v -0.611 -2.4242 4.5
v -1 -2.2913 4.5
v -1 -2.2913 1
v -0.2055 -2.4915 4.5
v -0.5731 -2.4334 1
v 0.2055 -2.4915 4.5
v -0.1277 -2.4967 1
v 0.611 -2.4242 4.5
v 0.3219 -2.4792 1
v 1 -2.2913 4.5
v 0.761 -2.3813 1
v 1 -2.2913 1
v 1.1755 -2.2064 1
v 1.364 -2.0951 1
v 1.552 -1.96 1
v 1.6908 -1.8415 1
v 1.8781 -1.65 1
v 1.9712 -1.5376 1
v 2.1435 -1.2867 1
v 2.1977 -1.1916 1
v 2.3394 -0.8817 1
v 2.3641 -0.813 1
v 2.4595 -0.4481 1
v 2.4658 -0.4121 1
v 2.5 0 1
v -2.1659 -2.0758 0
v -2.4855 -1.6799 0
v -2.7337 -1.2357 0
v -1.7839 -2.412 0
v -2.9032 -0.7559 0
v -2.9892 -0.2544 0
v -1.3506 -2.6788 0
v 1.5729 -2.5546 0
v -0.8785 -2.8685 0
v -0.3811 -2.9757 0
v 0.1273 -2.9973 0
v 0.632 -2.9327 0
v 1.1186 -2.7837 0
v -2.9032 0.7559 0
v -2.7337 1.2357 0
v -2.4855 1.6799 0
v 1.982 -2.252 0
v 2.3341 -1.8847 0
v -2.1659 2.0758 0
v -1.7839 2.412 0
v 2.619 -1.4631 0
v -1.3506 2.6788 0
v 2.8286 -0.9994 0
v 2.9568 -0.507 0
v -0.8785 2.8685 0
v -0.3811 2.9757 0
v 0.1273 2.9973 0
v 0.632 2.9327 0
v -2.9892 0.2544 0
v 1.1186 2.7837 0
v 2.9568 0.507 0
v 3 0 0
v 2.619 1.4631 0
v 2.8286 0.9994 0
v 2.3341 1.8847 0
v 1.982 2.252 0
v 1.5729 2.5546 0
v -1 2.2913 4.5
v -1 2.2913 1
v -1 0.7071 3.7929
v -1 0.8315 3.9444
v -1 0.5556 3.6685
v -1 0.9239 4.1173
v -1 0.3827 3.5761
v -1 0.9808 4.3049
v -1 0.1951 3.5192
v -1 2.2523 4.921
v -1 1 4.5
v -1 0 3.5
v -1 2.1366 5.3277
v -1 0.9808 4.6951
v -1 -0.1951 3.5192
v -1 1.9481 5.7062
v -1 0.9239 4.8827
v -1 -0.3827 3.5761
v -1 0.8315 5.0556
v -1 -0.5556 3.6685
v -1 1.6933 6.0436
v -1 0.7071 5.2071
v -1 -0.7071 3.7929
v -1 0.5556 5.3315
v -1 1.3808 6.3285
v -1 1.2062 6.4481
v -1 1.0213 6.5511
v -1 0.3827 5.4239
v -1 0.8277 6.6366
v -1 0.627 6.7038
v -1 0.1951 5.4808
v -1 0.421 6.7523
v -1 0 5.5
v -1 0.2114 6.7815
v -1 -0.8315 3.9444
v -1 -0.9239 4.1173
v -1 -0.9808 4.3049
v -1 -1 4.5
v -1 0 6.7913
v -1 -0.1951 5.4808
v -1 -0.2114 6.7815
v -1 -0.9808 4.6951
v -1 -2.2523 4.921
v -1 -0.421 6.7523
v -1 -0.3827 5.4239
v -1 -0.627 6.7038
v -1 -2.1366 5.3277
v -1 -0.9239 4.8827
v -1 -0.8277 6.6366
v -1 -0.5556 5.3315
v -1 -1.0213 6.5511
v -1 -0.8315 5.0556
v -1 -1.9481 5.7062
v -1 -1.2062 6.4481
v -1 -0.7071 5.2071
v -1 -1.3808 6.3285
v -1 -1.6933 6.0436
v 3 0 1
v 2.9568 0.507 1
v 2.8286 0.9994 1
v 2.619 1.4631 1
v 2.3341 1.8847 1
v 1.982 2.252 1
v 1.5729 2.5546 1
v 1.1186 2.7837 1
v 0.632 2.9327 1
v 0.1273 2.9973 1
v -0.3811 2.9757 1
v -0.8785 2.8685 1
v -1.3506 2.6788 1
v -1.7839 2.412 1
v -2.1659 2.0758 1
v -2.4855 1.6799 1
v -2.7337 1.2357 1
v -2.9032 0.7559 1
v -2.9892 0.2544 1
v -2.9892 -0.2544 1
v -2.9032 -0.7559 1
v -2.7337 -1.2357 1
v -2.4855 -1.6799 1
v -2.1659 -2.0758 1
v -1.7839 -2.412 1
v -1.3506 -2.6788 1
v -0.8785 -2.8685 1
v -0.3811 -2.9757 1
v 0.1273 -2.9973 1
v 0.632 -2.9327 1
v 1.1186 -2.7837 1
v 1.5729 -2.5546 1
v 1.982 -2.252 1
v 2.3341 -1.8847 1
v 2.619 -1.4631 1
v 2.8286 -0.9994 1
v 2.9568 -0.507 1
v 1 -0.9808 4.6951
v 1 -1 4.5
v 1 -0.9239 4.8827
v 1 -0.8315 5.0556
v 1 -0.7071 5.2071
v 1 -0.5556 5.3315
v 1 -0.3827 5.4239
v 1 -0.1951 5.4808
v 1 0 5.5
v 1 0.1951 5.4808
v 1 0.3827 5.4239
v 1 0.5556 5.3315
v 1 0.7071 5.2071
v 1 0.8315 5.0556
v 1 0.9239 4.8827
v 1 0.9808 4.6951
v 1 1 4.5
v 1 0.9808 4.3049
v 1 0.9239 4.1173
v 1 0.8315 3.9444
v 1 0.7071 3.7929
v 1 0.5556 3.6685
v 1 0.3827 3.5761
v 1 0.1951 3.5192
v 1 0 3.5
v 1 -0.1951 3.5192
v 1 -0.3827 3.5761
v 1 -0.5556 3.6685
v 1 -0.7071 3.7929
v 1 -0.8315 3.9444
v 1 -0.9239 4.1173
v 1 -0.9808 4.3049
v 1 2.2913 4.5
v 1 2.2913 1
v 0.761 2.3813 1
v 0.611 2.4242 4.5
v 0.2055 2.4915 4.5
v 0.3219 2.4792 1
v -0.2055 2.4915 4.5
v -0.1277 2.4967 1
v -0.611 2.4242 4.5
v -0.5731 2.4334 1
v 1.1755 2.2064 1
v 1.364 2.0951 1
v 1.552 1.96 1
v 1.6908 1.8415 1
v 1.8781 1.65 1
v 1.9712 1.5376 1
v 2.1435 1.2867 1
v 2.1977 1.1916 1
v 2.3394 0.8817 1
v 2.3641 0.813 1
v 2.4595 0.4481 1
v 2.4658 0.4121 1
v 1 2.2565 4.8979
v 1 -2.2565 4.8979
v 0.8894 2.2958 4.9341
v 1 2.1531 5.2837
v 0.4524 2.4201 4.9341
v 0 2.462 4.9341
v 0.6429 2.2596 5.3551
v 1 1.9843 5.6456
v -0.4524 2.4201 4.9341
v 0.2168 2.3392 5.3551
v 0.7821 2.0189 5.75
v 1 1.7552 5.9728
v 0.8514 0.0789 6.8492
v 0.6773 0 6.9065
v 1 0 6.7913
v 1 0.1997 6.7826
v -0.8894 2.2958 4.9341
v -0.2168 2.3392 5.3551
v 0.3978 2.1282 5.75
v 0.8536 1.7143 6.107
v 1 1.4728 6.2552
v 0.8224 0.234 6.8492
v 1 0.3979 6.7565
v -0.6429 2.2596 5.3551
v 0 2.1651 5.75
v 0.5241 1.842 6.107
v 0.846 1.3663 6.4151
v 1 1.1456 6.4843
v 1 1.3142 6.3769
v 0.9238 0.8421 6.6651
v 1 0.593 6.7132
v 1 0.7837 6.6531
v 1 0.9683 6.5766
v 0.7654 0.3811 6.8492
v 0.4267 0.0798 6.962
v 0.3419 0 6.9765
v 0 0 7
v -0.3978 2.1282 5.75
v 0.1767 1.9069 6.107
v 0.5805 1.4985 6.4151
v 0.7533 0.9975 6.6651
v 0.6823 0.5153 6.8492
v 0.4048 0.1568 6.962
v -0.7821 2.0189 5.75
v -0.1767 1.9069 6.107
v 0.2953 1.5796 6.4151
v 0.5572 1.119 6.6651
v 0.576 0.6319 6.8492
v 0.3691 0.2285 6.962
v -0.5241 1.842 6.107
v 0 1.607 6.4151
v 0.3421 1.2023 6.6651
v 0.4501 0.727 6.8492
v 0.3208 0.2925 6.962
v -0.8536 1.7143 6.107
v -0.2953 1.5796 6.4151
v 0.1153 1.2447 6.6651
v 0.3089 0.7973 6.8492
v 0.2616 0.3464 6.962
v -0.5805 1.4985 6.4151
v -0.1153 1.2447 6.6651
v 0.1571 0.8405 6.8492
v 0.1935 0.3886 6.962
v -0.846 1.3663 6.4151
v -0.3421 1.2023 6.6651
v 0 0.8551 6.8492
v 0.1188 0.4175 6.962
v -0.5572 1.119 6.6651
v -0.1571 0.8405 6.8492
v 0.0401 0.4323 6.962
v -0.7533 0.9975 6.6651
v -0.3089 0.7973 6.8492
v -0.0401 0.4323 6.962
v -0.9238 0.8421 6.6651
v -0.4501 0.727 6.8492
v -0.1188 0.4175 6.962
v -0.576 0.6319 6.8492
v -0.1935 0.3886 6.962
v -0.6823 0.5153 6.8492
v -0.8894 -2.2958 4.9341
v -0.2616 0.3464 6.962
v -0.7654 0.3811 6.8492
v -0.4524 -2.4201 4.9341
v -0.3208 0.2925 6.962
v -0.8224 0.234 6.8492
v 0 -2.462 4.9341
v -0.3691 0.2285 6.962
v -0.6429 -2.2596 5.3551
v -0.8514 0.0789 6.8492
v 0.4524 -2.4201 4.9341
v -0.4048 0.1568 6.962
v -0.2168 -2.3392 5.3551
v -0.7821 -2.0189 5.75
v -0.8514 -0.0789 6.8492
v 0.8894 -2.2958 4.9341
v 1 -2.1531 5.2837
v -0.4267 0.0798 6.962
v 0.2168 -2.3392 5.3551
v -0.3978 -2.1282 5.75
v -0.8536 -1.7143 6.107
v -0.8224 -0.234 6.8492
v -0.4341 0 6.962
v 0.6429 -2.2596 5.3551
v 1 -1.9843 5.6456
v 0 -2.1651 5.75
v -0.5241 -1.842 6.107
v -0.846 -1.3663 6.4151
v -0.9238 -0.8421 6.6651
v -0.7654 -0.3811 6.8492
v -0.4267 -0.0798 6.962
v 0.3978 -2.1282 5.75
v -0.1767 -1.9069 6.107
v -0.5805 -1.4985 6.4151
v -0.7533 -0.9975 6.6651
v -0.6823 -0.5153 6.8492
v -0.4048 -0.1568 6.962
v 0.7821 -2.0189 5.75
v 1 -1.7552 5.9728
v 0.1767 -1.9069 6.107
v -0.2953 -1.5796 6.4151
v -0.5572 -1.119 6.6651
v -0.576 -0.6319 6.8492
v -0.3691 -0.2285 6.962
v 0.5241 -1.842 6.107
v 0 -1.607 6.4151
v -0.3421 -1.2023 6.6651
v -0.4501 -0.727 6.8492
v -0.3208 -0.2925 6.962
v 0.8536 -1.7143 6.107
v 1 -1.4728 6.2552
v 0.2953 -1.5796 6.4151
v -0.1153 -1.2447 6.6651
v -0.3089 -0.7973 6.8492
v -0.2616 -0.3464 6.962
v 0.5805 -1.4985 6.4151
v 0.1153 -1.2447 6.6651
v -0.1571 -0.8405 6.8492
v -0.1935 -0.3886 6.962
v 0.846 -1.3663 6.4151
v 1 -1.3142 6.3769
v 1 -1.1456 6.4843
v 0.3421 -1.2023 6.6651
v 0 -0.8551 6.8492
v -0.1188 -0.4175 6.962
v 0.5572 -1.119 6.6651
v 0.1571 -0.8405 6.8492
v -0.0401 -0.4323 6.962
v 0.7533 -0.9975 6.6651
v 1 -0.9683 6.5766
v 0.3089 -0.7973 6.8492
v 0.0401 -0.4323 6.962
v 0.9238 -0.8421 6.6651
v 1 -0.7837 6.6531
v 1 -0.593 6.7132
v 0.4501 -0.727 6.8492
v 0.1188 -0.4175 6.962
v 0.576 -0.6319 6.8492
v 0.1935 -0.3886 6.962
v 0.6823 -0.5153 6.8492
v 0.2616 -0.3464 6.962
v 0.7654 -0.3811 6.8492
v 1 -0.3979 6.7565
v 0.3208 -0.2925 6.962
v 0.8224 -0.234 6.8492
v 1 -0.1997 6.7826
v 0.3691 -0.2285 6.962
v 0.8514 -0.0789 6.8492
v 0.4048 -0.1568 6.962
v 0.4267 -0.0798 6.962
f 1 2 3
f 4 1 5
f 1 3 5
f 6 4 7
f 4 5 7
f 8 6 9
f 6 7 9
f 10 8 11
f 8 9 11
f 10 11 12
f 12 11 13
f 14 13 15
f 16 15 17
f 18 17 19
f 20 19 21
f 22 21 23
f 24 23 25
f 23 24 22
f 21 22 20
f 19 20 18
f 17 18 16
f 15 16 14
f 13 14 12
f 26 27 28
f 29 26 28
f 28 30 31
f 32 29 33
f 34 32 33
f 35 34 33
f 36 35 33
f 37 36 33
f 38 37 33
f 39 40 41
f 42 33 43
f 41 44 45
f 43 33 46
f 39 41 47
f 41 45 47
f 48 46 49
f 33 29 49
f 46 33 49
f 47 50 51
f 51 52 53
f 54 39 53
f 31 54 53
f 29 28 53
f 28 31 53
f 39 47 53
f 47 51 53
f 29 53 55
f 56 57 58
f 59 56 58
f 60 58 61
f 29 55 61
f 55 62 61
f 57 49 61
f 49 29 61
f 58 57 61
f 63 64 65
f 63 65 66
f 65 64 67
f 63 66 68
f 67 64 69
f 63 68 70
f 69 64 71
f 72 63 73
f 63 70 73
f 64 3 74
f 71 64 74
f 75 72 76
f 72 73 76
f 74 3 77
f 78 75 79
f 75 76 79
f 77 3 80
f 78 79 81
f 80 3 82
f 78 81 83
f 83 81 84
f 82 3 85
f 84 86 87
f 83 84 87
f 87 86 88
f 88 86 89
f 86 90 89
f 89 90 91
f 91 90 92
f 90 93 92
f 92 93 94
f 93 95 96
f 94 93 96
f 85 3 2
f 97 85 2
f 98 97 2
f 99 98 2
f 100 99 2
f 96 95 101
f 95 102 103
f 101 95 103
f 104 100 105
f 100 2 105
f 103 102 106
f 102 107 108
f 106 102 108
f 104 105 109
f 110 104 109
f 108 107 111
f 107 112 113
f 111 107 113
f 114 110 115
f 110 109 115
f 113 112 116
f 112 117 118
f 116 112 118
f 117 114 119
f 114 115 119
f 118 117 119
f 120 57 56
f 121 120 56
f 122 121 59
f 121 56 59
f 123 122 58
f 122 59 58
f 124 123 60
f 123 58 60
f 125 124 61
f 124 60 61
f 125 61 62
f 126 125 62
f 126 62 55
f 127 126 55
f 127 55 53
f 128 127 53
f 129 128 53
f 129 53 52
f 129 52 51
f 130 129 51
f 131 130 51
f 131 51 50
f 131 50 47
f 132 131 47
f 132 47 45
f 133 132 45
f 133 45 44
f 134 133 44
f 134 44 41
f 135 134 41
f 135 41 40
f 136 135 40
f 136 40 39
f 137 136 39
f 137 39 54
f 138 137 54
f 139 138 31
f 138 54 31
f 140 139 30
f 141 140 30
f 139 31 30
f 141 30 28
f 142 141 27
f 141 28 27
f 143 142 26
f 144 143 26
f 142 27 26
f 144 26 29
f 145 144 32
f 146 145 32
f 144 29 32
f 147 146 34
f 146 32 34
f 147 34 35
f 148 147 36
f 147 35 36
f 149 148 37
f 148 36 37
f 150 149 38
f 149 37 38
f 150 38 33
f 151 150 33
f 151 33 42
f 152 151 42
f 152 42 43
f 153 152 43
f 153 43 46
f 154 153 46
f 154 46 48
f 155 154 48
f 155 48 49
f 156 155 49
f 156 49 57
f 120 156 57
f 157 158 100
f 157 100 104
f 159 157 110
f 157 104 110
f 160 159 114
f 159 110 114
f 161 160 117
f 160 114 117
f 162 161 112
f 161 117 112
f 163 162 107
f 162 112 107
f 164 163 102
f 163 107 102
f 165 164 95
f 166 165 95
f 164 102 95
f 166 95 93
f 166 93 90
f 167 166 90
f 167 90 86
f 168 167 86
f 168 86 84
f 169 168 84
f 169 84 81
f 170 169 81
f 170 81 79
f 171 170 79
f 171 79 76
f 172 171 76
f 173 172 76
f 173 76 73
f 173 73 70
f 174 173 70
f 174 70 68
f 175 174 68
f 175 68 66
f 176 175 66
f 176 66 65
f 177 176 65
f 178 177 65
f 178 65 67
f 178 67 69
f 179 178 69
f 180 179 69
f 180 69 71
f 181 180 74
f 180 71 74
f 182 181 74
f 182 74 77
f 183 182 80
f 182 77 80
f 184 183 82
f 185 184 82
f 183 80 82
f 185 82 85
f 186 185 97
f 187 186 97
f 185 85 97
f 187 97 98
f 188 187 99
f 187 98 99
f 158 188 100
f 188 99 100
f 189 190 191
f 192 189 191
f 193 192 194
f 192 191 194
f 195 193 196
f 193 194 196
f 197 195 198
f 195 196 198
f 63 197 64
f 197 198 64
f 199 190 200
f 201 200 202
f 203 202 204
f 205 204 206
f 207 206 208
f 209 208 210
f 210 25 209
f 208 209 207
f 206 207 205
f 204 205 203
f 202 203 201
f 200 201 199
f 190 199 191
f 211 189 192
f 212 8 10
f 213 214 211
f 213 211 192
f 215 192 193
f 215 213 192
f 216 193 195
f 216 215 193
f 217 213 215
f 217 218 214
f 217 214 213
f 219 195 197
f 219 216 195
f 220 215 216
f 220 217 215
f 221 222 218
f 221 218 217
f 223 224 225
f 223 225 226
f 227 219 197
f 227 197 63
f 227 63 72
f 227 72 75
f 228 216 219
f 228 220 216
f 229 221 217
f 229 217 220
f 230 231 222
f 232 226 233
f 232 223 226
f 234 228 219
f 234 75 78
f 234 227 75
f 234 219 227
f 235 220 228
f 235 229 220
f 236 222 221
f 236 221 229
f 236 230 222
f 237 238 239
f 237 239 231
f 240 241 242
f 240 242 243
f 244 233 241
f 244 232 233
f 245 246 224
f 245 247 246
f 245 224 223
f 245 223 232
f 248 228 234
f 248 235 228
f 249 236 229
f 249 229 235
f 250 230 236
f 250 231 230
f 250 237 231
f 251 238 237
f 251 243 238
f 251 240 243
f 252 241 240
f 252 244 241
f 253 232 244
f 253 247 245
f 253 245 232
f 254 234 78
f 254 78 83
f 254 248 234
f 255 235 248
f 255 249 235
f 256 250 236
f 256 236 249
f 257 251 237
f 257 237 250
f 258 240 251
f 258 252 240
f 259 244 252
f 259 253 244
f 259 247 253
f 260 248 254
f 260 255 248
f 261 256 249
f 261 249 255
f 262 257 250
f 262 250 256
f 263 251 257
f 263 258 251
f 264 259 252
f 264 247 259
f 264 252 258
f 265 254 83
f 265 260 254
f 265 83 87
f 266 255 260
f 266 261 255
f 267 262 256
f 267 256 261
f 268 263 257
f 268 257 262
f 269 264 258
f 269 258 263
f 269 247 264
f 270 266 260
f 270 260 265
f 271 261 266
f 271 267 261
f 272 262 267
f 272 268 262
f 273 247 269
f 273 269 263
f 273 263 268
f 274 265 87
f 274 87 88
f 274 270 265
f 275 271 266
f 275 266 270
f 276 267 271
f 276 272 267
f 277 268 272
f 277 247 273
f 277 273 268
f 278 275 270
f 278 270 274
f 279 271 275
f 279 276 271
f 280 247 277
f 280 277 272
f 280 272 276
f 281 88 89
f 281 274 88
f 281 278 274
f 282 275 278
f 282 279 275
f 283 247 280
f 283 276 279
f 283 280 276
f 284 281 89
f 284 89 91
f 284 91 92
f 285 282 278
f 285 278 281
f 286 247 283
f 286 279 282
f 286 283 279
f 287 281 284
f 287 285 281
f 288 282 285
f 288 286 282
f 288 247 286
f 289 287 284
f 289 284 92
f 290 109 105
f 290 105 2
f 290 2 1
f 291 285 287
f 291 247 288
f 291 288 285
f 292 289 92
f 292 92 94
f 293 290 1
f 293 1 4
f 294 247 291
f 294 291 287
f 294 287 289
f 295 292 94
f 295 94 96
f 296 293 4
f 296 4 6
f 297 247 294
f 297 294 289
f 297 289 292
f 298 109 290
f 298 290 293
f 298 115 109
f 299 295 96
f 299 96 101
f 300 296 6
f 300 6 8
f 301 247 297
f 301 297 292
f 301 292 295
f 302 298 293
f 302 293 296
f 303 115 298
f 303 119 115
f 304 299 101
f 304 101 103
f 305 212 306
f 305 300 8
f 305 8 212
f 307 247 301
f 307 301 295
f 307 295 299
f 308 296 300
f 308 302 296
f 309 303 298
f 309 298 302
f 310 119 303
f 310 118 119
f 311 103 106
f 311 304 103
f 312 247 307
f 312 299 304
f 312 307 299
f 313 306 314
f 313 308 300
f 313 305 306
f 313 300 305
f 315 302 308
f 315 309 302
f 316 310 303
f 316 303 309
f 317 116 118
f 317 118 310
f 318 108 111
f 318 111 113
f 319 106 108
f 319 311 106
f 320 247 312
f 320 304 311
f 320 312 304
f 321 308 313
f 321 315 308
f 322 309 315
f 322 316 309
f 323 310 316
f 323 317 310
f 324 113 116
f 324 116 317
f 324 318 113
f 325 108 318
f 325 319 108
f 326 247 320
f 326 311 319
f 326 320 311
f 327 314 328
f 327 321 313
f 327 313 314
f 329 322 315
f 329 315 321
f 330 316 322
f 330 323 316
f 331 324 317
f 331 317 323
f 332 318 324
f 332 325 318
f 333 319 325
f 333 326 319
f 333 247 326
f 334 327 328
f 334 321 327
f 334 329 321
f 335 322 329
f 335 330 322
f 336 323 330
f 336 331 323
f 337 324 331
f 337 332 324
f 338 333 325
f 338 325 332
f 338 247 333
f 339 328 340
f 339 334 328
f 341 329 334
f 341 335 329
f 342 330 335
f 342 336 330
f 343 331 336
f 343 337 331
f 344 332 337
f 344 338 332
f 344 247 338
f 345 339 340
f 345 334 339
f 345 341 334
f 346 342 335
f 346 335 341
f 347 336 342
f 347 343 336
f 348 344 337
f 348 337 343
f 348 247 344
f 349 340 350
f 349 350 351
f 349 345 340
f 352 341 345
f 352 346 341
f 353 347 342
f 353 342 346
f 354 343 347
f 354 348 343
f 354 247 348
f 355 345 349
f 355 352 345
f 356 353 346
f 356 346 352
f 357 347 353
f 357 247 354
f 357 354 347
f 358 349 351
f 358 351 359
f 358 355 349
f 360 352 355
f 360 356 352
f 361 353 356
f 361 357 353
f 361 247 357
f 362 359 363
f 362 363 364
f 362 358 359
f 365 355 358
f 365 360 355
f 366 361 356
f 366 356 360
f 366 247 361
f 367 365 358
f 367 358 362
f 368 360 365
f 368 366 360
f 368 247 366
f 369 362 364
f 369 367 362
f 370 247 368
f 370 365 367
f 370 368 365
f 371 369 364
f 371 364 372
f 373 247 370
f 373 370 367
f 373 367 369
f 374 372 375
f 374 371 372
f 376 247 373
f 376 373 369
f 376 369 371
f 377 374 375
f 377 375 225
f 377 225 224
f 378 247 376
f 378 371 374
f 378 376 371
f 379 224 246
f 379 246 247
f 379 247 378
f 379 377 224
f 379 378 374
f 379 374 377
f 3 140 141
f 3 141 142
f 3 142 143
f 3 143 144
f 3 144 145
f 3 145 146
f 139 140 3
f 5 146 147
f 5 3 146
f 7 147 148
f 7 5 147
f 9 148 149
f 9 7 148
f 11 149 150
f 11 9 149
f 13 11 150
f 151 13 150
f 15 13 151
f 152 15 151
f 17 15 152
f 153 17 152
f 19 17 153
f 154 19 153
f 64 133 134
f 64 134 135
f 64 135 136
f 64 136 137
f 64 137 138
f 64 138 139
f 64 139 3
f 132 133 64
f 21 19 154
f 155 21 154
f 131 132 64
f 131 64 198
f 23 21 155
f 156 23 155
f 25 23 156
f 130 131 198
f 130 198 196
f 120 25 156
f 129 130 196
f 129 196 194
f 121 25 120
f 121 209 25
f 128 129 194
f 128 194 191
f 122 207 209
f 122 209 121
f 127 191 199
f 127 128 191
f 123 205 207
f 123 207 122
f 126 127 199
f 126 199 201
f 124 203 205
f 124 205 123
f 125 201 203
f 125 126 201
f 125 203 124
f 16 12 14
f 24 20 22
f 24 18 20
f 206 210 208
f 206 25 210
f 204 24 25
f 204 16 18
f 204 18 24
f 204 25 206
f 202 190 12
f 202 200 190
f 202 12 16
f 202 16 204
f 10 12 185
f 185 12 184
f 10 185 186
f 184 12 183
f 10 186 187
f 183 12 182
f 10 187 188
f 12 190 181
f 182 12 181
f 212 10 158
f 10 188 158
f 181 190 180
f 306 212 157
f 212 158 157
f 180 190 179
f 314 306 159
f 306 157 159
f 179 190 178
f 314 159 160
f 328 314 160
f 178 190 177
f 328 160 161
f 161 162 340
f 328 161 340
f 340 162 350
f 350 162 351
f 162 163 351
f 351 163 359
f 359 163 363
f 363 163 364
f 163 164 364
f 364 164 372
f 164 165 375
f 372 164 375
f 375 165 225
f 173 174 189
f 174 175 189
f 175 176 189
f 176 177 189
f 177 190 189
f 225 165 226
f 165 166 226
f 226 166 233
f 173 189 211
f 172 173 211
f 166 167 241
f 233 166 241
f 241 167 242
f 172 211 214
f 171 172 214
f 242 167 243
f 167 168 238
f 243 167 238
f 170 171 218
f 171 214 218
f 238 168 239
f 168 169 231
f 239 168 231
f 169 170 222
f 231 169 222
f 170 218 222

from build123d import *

# Parameters (mm, degrees)
F0_R     = 3
F1_DEPTH = 1
F2_R     = 2.5
F3_DEPTH = 6
F4_R     = 2.5
F5_W     = 2.035479
F5_H     = 6.262277
F5_W_2   = 2.073893
F5_H_2   = 6.24879
F6_DEPTH = 12.5
F7_R     = 1
F8_DEPTH = 25


with BuildPart() as f1:
    # F0 (on Top) → F1 (new body)
    with BuildSketch(Plane.XY):
        Circle(F0_R)
    extrude(amount=F1_DEPTH)

    # F2 (on face) → F3 (join)
    with BuildSketch(Plane.XY.offset(1)):
        Circle(F2_R)
    extrude(amount=F3_DEPTH)

    # F4
    f4_edges = [f1.edges().sort_by_distance(p)[0] for p in [
        (-2.5, 0, 7),
    ]]
    fillet(f4_edges, radius=F4_R)

    # F5 (on Front) → F6 (cut, symmetric)
    with BuildSketch(Plane.XZ):
        with Locations((2.01774, 4.131139)):
            Rectangle(F5_W, F5_H)
        with Locations((-2.036946, 4.124395)):
            Rectangle(F5_W_2, F5_H_2)
    extrude(amount=F6_DEPTH, both=True, mode=Mode.SUBTRACT)

    # F7 (on face) → F8 (cut)
    with BuildSketch(Plane(origin=(-1, 0, 0), x_dir=(0, -1, 0), z_dir=(-1, 0, 0))):
        with Locations((0, 4.5)):
            Circle(F7_R)
    extrude(amount=-F8_DEPTH, mode=Mode.SUBTRACT)


solid = f1.part
